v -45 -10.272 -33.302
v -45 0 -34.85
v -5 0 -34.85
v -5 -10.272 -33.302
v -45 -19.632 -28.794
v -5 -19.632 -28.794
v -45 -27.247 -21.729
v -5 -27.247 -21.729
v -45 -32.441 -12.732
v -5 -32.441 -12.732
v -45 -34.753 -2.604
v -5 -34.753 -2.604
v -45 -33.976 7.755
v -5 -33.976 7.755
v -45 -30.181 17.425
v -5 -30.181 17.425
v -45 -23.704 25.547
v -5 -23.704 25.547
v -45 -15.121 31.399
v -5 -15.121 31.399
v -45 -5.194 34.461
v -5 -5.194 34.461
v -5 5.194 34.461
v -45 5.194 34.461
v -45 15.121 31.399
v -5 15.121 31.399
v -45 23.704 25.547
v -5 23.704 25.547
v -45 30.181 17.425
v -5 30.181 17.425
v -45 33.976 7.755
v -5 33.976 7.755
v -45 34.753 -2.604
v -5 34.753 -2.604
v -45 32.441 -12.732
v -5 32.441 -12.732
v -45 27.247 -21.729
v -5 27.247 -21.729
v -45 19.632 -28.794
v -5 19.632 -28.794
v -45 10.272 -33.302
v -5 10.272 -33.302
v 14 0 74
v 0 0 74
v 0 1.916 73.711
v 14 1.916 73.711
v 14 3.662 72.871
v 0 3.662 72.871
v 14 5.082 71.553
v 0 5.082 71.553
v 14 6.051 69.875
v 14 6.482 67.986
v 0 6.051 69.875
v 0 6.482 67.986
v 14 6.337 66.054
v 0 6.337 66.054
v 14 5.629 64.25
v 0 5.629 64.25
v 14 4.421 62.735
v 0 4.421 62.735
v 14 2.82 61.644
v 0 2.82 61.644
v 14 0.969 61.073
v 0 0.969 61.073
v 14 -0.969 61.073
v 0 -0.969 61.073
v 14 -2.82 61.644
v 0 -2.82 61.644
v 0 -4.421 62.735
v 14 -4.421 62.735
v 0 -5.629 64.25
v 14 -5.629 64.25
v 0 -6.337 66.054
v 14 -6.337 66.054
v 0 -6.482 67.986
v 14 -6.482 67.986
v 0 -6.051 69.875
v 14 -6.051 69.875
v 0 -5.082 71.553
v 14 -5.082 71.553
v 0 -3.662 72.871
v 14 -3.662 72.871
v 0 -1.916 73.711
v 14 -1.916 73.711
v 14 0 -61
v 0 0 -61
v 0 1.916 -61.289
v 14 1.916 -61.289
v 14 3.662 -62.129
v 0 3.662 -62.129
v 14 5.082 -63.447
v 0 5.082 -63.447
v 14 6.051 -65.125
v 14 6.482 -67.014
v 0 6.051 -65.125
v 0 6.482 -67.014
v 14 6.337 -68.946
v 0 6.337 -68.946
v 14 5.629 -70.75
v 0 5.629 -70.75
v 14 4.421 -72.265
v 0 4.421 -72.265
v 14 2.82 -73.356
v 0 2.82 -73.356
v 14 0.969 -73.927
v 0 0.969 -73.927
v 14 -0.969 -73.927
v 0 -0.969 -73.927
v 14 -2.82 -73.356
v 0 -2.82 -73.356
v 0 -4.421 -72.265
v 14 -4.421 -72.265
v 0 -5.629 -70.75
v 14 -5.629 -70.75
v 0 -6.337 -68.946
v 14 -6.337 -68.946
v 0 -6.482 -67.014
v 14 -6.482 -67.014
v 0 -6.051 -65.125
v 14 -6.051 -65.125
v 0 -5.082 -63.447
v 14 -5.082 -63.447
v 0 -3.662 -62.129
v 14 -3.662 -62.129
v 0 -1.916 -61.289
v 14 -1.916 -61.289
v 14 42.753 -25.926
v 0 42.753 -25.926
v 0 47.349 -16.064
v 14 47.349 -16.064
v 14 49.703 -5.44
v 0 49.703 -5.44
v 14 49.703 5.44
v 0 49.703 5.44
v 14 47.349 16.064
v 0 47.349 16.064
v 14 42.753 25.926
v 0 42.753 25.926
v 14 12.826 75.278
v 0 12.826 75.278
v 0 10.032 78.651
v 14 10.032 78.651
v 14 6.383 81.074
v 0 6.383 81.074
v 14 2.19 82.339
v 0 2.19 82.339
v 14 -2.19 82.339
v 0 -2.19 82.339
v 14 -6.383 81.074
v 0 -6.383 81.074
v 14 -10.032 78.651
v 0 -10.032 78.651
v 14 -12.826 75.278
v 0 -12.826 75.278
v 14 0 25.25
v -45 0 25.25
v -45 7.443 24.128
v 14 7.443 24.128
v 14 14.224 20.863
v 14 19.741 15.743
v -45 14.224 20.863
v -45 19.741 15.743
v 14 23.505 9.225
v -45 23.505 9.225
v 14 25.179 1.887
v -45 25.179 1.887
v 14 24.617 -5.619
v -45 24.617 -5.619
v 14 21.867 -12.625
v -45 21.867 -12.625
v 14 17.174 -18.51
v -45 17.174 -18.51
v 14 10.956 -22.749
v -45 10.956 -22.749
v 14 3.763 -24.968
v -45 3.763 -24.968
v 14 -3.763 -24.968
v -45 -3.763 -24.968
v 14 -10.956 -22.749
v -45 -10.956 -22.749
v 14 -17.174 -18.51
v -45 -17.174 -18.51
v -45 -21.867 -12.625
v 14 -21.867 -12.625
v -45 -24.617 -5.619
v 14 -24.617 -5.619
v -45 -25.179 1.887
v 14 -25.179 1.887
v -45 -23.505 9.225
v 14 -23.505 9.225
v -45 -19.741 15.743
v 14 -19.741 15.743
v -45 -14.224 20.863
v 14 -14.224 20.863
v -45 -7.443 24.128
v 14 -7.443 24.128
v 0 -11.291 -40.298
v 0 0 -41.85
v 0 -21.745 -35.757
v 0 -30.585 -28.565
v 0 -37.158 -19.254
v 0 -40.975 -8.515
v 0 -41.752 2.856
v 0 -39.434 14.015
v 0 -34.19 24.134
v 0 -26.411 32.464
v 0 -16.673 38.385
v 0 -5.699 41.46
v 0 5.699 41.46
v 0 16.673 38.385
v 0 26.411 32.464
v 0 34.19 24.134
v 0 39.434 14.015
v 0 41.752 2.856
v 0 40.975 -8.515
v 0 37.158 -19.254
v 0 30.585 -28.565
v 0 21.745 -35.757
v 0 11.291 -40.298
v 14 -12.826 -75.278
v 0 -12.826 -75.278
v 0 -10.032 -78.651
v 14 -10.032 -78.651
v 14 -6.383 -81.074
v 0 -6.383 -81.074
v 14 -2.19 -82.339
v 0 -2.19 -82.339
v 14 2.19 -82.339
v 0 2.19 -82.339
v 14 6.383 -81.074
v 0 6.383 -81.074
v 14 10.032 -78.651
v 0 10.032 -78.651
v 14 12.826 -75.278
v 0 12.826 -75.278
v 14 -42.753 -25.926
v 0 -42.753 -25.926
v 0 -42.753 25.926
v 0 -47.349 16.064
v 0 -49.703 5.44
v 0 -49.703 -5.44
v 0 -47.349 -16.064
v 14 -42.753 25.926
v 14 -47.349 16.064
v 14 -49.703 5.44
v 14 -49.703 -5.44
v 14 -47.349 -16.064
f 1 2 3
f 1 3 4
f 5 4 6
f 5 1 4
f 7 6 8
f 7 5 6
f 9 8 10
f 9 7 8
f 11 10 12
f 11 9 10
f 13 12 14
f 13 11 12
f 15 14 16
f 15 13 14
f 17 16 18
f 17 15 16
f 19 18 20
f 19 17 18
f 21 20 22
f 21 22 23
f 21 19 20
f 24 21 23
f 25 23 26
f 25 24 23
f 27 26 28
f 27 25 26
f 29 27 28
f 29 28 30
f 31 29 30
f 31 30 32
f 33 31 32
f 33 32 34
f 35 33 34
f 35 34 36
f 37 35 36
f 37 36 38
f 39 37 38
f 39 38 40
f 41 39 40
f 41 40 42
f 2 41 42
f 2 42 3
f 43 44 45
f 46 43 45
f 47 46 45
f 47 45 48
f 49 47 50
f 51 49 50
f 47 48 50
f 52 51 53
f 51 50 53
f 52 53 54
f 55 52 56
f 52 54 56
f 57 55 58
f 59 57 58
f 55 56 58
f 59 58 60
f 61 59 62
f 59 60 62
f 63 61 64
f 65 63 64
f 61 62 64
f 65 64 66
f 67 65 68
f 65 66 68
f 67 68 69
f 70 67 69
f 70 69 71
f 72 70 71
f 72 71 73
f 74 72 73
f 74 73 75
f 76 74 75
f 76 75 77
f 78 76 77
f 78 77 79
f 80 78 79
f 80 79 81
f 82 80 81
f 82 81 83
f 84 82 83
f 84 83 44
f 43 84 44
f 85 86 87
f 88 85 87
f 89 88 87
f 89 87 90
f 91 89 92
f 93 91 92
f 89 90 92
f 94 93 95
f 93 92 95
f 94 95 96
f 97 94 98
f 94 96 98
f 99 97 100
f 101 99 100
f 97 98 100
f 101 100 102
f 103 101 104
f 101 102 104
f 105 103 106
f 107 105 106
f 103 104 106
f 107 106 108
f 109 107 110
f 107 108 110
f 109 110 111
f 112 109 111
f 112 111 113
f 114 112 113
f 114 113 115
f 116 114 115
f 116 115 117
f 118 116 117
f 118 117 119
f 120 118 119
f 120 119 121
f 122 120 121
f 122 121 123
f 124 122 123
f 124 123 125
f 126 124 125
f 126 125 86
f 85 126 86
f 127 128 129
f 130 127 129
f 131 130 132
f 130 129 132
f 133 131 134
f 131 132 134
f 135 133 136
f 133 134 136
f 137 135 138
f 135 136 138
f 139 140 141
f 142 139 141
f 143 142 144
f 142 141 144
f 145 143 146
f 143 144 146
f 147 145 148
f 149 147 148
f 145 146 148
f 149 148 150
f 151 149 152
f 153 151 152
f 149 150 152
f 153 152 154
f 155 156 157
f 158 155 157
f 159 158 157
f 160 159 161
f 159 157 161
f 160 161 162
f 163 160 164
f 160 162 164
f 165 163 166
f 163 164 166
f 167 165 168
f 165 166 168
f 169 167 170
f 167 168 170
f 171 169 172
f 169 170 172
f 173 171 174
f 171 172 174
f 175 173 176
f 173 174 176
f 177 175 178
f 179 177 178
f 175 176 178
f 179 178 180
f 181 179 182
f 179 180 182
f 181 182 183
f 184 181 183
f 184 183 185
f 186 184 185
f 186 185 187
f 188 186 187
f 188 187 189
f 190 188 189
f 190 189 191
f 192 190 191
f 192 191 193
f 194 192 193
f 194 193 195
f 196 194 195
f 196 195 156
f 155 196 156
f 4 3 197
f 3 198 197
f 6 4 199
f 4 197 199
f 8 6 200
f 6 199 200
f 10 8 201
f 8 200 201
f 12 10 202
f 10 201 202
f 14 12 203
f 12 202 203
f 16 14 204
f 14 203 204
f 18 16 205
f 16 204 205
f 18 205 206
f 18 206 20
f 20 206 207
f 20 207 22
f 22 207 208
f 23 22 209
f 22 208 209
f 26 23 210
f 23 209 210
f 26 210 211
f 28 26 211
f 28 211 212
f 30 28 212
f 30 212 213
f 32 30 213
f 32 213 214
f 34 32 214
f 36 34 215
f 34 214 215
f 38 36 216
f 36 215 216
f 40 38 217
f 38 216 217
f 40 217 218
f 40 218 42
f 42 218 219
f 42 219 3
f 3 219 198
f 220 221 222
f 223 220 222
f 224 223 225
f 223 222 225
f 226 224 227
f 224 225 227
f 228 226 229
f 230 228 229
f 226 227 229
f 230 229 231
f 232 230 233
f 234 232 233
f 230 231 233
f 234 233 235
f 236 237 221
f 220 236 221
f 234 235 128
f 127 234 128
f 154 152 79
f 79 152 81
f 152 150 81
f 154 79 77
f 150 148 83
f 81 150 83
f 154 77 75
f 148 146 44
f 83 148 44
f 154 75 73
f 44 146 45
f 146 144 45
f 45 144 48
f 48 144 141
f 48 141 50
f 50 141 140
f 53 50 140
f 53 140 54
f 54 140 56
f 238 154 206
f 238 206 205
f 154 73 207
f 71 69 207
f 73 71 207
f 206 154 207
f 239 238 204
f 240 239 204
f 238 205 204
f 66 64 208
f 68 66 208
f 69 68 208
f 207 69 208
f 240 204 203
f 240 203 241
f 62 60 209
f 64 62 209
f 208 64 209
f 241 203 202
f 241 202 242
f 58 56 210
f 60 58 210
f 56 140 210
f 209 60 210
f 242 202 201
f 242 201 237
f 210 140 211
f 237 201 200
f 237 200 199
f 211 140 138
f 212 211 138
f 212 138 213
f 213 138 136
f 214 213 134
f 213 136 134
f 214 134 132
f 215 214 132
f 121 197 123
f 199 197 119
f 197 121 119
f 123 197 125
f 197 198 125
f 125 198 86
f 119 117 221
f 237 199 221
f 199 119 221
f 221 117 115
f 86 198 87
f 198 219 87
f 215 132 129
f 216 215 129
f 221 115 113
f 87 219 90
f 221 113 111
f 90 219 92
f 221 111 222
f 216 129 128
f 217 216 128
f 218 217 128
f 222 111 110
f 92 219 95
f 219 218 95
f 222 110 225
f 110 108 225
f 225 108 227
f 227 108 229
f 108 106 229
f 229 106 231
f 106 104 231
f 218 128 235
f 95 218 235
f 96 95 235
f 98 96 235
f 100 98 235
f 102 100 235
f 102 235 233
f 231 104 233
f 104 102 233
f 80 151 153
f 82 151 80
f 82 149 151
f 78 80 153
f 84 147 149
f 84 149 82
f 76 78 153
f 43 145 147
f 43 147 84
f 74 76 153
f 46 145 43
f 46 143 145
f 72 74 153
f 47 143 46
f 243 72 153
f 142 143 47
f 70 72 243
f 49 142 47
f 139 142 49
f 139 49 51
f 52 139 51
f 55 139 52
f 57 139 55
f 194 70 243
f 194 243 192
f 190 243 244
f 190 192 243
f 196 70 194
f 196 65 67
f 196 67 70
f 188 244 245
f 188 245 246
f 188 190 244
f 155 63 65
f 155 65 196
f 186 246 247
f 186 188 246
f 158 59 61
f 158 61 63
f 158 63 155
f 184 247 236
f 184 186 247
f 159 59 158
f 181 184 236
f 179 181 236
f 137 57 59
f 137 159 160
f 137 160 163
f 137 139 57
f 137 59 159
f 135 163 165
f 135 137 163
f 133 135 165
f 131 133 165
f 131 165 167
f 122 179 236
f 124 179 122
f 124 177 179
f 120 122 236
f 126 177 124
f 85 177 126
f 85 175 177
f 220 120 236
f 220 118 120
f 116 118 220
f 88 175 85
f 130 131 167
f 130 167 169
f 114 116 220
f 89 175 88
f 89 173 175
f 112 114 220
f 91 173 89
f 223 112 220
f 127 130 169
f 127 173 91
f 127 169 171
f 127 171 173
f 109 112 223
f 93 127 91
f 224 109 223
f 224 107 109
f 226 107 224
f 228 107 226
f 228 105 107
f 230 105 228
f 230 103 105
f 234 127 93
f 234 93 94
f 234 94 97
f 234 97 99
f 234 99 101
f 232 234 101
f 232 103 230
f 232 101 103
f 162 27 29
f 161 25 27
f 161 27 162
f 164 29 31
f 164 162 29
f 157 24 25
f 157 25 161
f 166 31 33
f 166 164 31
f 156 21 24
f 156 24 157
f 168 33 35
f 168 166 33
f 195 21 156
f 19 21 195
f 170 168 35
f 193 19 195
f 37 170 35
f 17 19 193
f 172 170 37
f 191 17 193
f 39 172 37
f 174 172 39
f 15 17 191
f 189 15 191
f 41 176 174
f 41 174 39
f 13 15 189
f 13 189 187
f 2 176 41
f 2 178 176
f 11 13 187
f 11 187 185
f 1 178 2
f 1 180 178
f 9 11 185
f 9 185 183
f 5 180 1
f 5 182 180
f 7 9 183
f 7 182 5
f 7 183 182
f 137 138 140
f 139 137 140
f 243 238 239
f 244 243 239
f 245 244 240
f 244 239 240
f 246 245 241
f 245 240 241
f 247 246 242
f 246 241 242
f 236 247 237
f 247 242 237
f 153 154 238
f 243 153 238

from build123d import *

# Parameters (mm, degrees)
BOSS_EXTRUDE1_DEPTH = 14
SKETCH2_R           = 6.5
CUT_EXTRUDE1_DEPTH  = 98.479485021
SKETCH3_R           = 25.25
CUT_EXTRUDE2_DEPTH  = 98.479485021
BOSS_EXTRUDE2_START = 45
SKETCH4_R           = 34.85
SKETCH4_R_2         = 25.25
BOSS_EXTRUDE2_DEPTH = 45


with BuildPart() as part:
    # Sketch1 → Boss-Extrude1 (new body)
    with BuildSketch(Plane(origin=(0, 0, 0), x_dir=(0, 0, -1), z_dir=(1, 0, 0))):
        with BuildLine():
            Line((-25.925925926, 42.753319928), (-75.277777778, 12.825995978))
            ThreePointArc((-75.277777778, 12.825995978), (-82.5, 0), (-75.277777778, -12.825995978))
            Line((-75.277777778, -12.825995978), (-25.925925926, -42.753319928))
            ThreePointArc((-25.925925926, -42.753319928), (0, -50), (25.925925926, -42.753319928))
            Line((25.925925926, -42.753319928), (75.277777778, -12.825995978))
            ThreePointArc((75.277777778, -12.825995978), (82.5, 0), (75.277777778, 12.825995978))
            Line((75.277777778, 12.825995978), (25.925925926, 42.753319928))
            ThreePointArc((25.925925926, 42.753319928), (0, 50), (-25.925925926, 42.753319928))
        make_face()
    extrude(amount=BOSS_EXTRUDE1_DEPTH)

    # Sketch2 → Cut-Extrude1 (cut, through all)
    with BuildSketch(Plane.ZY):
        with Locations((67.5, 0)):
            Circle(SKETCH2_R)
        with Locations((-67.5, 0)):
            Circle(SKETCH2_R)
    extrude(amount=-CUT_EXTRUDE1_DEPTH, mode=Mode.SUBTRACT)

    # Sketch3 → Cut-Extrude2 (cut, through all)
    with BuildSketch(Plane.ZY):
        Circle(SKETCH3_R)
    extrude(amount=-CUT_EXTRUDE2_DEPTH, mode=Mode.SUBTRACT)

    # Sketch4 → Boss-Extrude2 (add)
    with BuildSketch(Plane.ZY.offset(BOSS_EXTRUDE2_START)):
        with Locations(Location((0, 0, 0), (0, 0, 180))):
            Circle(SKETCH4_R)
        Circle(SKETCH4_R_2, mode=Mode.SUBTRACT)
    extrude(amount=-BOSS_EXTRUDE2_DEPTH)

    # Sketch5 → Revolve1 (revolve)
    with BuildSketch(Plane(origin=(0, 0, 0), x_dir=(1, 0, 0), z_dir=(0, 1, 0))):
        Polygon((0, 34.85), (-5, 34.85), (0, 41.85), align=None)
    revolve(axis=Axis((0, 0, 0), (-1, 0, 0)))


solid = part.part
